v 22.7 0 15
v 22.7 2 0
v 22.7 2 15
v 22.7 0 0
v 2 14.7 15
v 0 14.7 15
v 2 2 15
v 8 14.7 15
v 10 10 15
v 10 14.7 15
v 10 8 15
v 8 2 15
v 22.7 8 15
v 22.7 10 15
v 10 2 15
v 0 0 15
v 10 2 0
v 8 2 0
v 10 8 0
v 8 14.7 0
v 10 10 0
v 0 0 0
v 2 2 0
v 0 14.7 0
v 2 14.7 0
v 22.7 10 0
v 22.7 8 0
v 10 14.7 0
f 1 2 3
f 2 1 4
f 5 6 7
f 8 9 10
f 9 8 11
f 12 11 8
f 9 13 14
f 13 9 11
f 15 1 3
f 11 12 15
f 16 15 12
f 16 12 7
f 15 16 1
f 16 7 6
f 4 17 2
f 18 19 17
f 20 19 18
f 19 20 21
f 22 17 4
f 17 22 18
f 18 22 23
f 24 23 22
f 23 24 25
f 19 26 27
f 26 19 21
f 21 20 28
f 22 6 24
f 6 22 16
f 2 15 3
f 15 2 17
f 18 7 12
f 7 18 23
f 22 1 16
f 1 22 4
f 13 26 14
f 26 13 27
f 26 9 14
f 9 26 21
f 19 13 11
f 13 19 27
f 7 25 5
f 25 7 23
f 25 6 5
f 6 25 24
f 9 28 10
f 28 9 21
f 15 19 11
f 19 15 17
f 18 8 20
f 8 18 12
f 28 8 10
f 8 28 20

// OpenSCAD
gDefaultExtent = 25.4/2;
gDefaultGap = 5;	// MakerBot plywood
gDefaultThickness = 2;
gDefaultLength = 15;

gMakerBotDoubleSlotLength = 50;

// 1/4" plywood (6.29)
Lclip(gDefaultLength, gDefaultExtent, gDefaultThickness, 6.00);

//Lclip(gDefaultLength, gDefaultExtent, gDefaultThickness, gDefaultGap);
//LOffsetClip(gDefaultLength, gDefaultExtent, gDefaultThickness, gDefaultGap);
//Tclip(gDefaultLength, gDefaultExtent, gDefaultThickness, gDefaultGap);
//TOffsetClip(gDefaultLength, gDefaultExtent, gDefaultThickness, gDefaultGap);
//HClip(gDefaultLength, gDefaultExtent, gDefaultThickness, gDefaultGap);
//SingleSlotClip(gDefaultLength, gDefaultExtent, gDefaultThickness, gDefaultGap);
//DoubleSlotClip(gMakerBotDoubleSlotLength, gDefaultExtent, gDefaultThickness, gDefaultGap);

module Lclip(length, extent, thickness, gap)
{
	// Outer wall along x-axis	
	cube(size=[thickness*2+gap+extent, thickness, length]);
	
	// inner wall along x-axis
	translate([thickness*2+gap-0.25, thickness+gap, 0])
	cube(size=[extent+0.25, thickness, length]);

	// Outer wall along y-axis
	cube(size=[thickness, extent+thickness, length]);

	// inner wall along y-axis
	translate([thickness+gap, thickness-0.25,0])
	cube(size=[thickness, extent+0.25, length]);
}

module LOffsetClip(length, extent, thickness, gap)
{
	// Outer wall along x-axis	
	cube(size=[thickness*2+gap+extent, thickness, length]);
	
	// inner wall along x-axis
	translate([thickness*2+gap-0.25, thickness+gap, 0])
	cube(size=[extent+0.25, thickness, length]);

	// Outer wall along y-axis
	cube(size=[thickness, thickness*2+gap+extent, length]);

	// inner wall along y-axis
	translate([thickness+gap, 0,0])
	cube(size=[thickness, thickness*2+gap+extent, length]);

	// Joining corner section
	cube(size=[gap+thickness*2, gap+thickness*2, length]);
}

module Tclip(length, extent, thickness, gap)
{
	// Outer wall along x-axis	
	cube(size=[thickness*2+gap+extent, thickness, length]);
	
	// inner wall along x-axis
	translate([thickness*2+gap-0.25, thickness+gap, 0])
	cube(size=[extent+0.25, thickness, length]);

	// Outer wall along y-axis
	cube(size=[thickness, extent+thickness, length]);

	// inner wall along y-axis
	translate([thickness+gap, thickness-0.25,0])
	cube(size=[thickness, extent+0.25, length]);

	// Negative x-axis
	translate([-extent+0.25,0,0])
	cube(size=[extent+0.25, thickness, length]);

	// inner wall along negative x-axis
	translate([-extent+0.25, thickness+gap, 0])
	cube(size=[extent+0.25, thickness, length]);

}

module TOffsetClip(length, extent, thickness, gap)
{
	xwalllength = thickness*2+gap+extent;

	// Joining corner section
	cube(size=[gap+thickness*2, gap+thickness*2, length]);

	// Outer wall along x-axis	
	cube(size=[thickness*2+gap+extent, thickness, length]);
	
	translate([-extent, 0, 0])
	cube(size=[extent+0.25, thickness, length]);

	translate([-extent, thickness+gap, 0])
	cube(size=[extent+0.25, thickness, length]);

	// inner wall along x-axis
	translate([0, thickness+gap, 0])
	cube(size=[thickness*2+gap+extent, thickness, length]);

	// Outer wall along y-axis
	cube(size=[thickness, thickness*2+gap+extent, length]);

	// inner wall along y-axis
	translate([thickness+gap, 0,0])
	cube(size=[thickness, thickness*2+gap+extent, length]);

}

module HClip(length, extent, thickness, gap)
{
	union()
	{
		// Outer wall along x-axis	
		translate([-extent-thickness/2, 0,0])
		cube(size=[thickness+extent*2, thickness, length]);
		
		translate([-extent-thickness/2, thickness+gap-0.25,0])
		cube(size=[thickness+extent*2, thickness+0.25, length]);
	
		// divider wall along y-axis
		translate([-thickness/2, thickness-0.25, 0])
		cube(size=[thickness, gap+thickness+0.25, length]);
	}
}

// This clip is meant to fit within a cutout slot
// It has a tab for the cutout on one side
// and a slot for the panel on the other side
module SingleSlotClip(length, extent, thickness, gap)
{
	baselength = 2*thickness+gap;

	tablength = 5.25;
	tabheight = 10;
	tabwidth = gap;

	union()
	{
		// Base wall along x-axis
		cube(size=[baselength, thickness, length]);
	
		// Panel clip along y-axis
		translate([0, thickness-0.25, 0])
		cube(size=[thickness, extent+0.25, length]);
	
		translate([thickness+gap, thickness-0.25, 0])
		cube(size=[thickness, extent+0.25, length]);
	
		// Place a slot on the back
		translate([(baselength-tablength)/2, -tabwidth+0.25, (length-tablength)/2-tablength/2])
		cube(size=[5.125, tabwidth+0.25, 10]);
	}
}

// This clip is meant to fit within a cutout slot
// It has a tab for the cutout on one side
// and a slot for the panel on the other side
module DoubleSlotClip(length, extent, thickness, gap)
{
	baselength = 2*thickness+gap;

	tablength = 5.25;
	tabheight = 10;
	tabwidth = gap;

	difference()
	{
		union()
		{
			// Base wall along x-axis
			cube(size=[baselength, thickness, length]);
		
			// Panel clip along y-axis
			translate([0, thickness-0.25, 0])
			cube(size=[thickness, extent+0.25, length]);
		
			translate([thickness+gap, thickness-0.25, 0])
			cube(size=[thickness, extent+0.25, length]);
		
			// Place two slots on the back, at the edges
			translate([(baselength-tablength)/2, -tabwidth+0.25, (length-tabheight)])
			cube(size=[tablength, tabwidth+0.25, tabheight]);
	
			translate([(baselength-tablength)/2, -tabwidth+0.25, 0])
			cube(size=[tablength, tabwidth+0.25, tabheight]);
	
		}
		// Subtract a mounting hole for a roughly M3 sized screw
		translate([baselength/2, thickness+0.25, length/2])
		rotate([90, 0,0])
		cylinder(r=3/2, h=thickness+0.5, $fn=12);
	}
}
